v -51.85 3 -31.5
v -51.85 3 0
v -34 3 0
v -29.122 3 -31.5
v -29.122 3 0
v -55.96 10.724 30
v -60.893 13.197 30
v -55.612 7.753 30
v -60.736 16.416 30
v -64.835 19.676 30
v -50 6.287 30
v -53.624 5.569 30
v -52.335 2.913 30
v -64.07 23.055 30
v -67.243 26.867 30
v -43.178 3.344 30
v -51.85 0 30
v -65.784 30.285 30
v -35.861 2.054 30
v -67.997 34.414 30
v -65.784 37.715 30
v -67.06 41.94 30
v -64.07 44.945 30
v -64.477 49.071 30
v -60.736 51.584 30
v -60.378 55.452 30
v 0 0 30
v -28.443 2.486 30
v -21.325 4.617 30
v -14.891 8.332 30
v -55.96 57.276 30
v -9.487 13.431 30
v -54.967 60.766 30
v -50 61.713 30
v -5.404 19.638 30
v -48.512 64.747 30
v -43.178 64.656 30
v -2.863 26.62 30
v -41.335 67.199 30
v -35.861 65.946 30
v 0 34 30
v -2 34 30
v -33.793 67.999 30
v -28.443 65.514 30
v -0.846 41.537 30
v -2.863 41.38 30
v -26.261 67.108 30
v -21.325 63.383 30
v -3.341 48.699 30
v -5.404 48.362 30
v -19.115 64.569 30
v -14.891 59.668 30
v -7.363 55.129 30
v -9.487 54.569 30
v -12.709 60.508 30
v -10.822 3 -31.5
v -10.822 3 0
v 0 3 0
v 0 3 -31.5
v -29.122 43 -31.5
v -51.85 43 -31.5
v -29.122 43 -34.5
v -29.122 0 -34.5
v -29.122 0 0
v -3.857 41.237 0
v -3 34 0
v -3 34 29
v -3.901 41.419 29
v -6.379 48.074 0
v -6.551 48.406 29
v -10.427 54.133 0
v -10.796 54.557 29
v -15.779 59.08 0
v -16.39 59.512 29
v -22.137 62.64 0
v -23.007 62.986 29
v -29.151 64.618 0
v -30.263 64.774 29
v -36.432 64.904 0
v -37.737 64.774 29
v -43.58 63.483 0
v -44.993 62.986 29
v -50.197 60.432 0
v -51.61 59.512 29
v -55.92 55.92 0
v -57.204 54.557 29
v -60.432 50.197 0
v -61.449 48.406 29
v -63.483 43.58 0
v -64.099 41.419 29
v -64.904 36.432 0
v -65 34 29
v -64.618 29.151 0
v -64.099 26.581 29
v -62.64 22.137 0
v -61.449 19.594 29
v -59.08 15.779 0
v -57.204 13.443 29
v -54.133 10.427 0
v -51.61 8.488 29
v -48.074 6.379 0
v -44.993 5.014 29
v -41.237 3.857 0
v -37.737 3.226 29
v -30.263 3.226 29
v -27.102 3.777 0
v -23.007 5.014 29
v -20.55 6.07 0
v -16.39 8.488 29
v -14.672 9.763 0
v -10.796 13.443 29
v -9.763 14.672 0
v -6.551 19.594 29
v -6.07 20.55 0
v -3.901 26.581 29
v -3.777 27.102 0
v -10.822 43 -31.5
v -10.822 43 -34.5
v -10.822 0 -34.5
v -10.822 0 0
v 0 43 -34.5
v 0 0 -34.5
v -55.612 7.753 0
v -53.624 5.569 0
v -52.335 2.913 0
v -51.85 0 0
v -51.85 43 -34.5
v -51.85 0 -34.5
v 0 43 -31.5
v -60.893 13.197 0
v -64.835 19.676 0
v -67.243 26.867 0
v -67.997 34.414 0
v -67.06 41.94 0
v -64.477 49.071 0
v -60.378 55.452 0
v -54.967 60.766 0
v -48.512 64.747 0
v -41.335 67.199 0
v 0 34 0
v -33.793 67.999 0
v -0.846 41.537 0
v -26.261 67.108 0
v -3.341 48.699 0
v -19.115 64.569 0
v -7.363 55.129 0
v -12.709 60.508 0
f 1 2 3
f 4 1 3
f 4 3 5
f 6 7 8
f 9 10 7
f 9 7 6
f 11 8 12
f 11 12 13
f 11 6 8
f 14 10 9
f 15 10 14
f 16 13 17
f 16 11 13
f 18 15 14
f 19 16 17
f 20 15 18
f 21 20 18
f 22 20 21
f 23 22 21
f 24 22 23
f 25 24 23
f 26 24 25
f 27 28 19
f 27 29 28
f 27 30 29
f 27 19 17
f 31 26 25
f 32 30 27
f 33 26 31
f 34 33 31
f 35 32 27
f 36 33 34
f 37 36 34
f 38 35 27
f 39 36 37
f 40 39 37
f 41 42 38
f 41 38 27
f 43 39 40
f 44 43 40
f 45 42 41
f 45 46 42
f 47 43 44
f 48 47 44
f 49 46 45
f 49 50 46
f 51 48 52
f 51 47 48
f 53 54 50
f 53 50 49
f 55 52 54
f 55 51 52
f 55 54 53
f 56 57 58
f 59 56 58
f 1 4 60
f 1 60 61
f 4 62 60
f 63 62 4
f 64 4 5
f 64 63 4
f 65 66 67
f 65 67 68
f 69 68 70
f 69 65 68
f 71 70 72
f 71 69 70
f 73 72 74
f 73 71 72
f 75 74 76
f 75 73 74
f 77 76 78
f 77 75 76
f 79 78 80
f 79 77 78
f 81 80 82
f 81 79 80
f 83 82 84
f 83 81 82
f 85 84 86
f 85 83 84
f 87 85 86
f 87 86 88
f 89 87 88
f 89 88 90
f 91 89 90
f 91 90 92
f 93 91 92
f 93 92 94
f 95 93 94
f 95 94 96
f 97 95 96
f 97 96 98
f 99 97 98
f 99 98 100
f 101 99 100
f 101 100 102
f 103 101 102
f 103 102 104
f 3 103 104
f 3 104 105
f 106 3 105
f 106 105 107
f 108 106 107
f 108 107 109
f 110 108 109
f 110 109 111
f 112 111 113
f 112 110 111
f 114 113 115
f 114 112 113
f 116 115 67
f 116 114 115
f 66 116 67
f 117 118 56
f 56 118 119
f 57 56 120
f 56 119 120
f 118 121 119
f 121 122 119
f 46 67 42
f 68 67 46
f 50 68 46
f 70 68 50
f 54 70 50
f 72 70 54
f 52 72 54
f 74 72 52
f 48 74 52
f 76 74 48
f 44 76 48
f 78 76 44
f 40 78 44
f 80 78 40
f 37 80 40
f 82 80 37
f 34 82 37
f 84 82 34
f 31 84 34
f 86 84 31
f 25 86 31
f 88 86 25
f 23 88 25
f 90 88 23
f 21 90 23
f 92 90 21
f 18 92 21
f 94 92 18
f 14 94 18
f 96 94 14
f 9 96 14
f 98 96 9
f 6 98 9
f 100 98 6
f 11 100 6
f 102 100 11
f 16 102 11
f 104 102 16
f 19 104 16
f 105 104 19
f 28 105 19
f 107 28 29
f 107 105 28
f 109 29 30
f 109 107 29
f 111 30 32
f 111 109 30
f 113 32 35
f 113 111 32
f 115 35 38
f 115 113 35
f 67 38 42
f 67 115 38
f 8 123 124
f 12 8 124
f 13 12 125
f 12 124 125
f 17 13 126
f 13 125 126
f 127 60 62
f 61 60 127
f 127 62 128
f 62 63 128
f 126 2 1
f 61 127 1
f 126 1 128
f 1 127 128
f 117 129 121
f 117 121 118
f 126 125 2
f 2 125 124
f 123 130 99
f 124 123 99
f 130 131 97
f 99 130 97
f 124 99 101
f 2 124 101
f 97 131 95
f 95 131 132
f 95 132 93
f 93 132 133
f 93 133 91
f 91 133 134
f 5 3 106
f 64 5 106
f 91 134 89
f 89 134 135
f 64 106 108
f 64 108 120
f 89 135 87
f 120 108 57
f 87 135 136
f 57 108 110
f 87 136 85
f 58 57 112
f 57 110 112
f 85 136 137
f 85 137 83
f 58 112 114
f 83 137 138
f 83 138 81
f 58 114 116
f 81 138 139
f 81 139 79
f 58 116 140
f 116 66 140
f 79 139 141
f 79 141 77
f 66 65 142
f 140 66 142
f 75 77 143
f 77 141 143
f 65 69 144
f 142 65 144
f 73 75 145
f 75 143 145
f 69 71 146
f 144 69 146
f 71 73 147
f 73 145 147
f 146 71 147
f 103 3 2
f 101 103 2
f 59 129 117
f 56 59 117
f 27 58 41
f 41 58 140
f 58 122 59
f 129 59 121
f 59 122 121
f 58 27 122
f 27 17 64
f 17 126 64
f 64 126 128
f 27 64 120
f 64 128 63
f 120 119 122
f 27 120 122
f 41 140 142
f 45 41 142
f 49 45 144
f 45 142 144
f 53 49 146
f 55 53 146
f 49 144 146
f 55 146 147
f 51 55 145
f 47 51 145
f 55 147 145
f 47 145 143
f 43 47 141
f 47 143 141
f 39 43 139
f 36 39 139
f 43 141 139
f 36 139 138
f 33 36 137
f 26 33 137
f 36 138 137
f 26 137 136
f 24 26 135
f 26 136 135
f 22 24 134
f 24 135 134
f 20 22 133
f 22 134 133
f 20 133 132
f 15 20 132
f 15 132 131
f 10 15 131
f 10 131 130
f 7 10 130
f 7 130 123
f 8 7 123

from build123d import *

# Parameters (mm, degrees)
F0_R        = 31
F1_DEPTH    = 3
F2_W        = 22.7279674787
F2_H        = 3
F2_W_2      = 10.8224550456
F3_DEPTH    = 34.5
F4_W        = 10.8224550456
F4_H        = 3
F5_DEPTH    = 40
F6_W        = 22.7279674787
F6_H        = 3
F7_DEPTH    = 40
F8_DEPTH    = 27
F9_T1_DEPTH = 30
F10_SIZE    = 1


# Not quite as in the source:
# - a fillet or chamfer that OpenCascade refuses, or shapes differently, is made with other operations: its cross-section is extruded or revolved along the edge and cut away or added


with BuildPart() as f1:
    # F0 (on Top) → F1 (new body)
    with BuildSketch(Plane.XY):
        with BuildLine():
            ThreePointArc((-34, 0), (-9.9583694397, 9.9583694397), (0, 34))
            ThreePointArc((0, 34), (-50.5693336344, 63.6893446023), (-51.8504225243, 5.0627849352))
            ThreePointArc((-51.8504225243, 5.0627849352), (-43.2772487246, 1.2901749301), (-34, 0))
        make_face()
        with Locations((-34, 34)):
            Circle(F0_R, mode=Mode.SUBTRACT)
        with BuildLine():
            ThreePointArc((-34, 0), (-43.2772487246, 1.2901749301), (-51.8504225243, 5.0627849352))
            Line((-51.8504225243, 5.0627849352), (-51.8504225243, 0))
            Line((-51.8504225243, 0), (-34, 0))
        make_face()
        with BuildLine():
            Line((0, 0), (0, 34))
            ThreePointArc((0, 34), (-9.9583694397, 9.9583694397), (-34, 0))
            Line((-34, 0), (0, 0))
        make_face()
    extrude(amount=F1_DEPTH)

    # F2 (on face) → F3 (join)
    with BuildSketch(Plane(origin=(0, 0, 0), x_dir=(1, 0, 0), z_dir=(0, 0, -1))):
        with Locations((-40.4864387849, -1.5)):
            Rectangle(F2_W, F2_H)
        with Locations((-5.4112275228, -1.5)):
            Rectangle(F2_W_2, F2_H)
    extrude(amount=F3_DEPTH)

    # F4 (on face) → F5 (join)
    with BuildSketch(Plane(origin=(0, 3, 0), x_dir=(-1, 0, 0), z_dir=(0, 1, 0))):
        with Locations((5.4112275228, -33)):
            Rectangle(F4_W, F4_H)
    extrude(amount=F5_DEPTH)

    # F6 (on face) → F7 (join)
    with BuildSketch(Plane(origin=(0, 3, 0), x_dir=(-1, 0, 0), z_dir=(0, 1, 0))):
        with Locations((40.4864387849, -33)):
            Rectangle(F6_W, F6_H)
    extrude(amount=F7_DEPTH)

    # F8 (add): a face of the model
    f8_faces = [f1.faces().sort_by_distance(p)[0] for p in [
        (-50.1006821075, 62.8496031264, 3),
    ]]
    extrude(f8_faces, amount=F8_DEPTH)

    # F9: fillet of radius 10.3311475389 on 1 edges, made by hand

    # F9_s2 → F9_t1 (join)
    with BuildSketch(Plane.XY):
        with BuildLine():
            ThreePointArc((-55.6121599632, 7.7528184042), (-52.8843757474, 4.2873402421), (-51.8504225243, 0))
            Line((-51.8504225243, 0), (-51.8504225243, 5.0627849352))
            ThreePointArc((-51.8504225243, 5.0627849352), (-53.7770807796, 6.3437696741), (-55.6121599632, 7.7528184042))
        make_face()
    extrude(amount=F9_T1_DEPTH)

    # F10
    f10_edges = [f1.edges().sort_by_distance(p)[0] for p in [
        (-65, 34, 30),
    ]]
    chamfer(f10_edges, length=F10_SIZE)


solid = f1.part
